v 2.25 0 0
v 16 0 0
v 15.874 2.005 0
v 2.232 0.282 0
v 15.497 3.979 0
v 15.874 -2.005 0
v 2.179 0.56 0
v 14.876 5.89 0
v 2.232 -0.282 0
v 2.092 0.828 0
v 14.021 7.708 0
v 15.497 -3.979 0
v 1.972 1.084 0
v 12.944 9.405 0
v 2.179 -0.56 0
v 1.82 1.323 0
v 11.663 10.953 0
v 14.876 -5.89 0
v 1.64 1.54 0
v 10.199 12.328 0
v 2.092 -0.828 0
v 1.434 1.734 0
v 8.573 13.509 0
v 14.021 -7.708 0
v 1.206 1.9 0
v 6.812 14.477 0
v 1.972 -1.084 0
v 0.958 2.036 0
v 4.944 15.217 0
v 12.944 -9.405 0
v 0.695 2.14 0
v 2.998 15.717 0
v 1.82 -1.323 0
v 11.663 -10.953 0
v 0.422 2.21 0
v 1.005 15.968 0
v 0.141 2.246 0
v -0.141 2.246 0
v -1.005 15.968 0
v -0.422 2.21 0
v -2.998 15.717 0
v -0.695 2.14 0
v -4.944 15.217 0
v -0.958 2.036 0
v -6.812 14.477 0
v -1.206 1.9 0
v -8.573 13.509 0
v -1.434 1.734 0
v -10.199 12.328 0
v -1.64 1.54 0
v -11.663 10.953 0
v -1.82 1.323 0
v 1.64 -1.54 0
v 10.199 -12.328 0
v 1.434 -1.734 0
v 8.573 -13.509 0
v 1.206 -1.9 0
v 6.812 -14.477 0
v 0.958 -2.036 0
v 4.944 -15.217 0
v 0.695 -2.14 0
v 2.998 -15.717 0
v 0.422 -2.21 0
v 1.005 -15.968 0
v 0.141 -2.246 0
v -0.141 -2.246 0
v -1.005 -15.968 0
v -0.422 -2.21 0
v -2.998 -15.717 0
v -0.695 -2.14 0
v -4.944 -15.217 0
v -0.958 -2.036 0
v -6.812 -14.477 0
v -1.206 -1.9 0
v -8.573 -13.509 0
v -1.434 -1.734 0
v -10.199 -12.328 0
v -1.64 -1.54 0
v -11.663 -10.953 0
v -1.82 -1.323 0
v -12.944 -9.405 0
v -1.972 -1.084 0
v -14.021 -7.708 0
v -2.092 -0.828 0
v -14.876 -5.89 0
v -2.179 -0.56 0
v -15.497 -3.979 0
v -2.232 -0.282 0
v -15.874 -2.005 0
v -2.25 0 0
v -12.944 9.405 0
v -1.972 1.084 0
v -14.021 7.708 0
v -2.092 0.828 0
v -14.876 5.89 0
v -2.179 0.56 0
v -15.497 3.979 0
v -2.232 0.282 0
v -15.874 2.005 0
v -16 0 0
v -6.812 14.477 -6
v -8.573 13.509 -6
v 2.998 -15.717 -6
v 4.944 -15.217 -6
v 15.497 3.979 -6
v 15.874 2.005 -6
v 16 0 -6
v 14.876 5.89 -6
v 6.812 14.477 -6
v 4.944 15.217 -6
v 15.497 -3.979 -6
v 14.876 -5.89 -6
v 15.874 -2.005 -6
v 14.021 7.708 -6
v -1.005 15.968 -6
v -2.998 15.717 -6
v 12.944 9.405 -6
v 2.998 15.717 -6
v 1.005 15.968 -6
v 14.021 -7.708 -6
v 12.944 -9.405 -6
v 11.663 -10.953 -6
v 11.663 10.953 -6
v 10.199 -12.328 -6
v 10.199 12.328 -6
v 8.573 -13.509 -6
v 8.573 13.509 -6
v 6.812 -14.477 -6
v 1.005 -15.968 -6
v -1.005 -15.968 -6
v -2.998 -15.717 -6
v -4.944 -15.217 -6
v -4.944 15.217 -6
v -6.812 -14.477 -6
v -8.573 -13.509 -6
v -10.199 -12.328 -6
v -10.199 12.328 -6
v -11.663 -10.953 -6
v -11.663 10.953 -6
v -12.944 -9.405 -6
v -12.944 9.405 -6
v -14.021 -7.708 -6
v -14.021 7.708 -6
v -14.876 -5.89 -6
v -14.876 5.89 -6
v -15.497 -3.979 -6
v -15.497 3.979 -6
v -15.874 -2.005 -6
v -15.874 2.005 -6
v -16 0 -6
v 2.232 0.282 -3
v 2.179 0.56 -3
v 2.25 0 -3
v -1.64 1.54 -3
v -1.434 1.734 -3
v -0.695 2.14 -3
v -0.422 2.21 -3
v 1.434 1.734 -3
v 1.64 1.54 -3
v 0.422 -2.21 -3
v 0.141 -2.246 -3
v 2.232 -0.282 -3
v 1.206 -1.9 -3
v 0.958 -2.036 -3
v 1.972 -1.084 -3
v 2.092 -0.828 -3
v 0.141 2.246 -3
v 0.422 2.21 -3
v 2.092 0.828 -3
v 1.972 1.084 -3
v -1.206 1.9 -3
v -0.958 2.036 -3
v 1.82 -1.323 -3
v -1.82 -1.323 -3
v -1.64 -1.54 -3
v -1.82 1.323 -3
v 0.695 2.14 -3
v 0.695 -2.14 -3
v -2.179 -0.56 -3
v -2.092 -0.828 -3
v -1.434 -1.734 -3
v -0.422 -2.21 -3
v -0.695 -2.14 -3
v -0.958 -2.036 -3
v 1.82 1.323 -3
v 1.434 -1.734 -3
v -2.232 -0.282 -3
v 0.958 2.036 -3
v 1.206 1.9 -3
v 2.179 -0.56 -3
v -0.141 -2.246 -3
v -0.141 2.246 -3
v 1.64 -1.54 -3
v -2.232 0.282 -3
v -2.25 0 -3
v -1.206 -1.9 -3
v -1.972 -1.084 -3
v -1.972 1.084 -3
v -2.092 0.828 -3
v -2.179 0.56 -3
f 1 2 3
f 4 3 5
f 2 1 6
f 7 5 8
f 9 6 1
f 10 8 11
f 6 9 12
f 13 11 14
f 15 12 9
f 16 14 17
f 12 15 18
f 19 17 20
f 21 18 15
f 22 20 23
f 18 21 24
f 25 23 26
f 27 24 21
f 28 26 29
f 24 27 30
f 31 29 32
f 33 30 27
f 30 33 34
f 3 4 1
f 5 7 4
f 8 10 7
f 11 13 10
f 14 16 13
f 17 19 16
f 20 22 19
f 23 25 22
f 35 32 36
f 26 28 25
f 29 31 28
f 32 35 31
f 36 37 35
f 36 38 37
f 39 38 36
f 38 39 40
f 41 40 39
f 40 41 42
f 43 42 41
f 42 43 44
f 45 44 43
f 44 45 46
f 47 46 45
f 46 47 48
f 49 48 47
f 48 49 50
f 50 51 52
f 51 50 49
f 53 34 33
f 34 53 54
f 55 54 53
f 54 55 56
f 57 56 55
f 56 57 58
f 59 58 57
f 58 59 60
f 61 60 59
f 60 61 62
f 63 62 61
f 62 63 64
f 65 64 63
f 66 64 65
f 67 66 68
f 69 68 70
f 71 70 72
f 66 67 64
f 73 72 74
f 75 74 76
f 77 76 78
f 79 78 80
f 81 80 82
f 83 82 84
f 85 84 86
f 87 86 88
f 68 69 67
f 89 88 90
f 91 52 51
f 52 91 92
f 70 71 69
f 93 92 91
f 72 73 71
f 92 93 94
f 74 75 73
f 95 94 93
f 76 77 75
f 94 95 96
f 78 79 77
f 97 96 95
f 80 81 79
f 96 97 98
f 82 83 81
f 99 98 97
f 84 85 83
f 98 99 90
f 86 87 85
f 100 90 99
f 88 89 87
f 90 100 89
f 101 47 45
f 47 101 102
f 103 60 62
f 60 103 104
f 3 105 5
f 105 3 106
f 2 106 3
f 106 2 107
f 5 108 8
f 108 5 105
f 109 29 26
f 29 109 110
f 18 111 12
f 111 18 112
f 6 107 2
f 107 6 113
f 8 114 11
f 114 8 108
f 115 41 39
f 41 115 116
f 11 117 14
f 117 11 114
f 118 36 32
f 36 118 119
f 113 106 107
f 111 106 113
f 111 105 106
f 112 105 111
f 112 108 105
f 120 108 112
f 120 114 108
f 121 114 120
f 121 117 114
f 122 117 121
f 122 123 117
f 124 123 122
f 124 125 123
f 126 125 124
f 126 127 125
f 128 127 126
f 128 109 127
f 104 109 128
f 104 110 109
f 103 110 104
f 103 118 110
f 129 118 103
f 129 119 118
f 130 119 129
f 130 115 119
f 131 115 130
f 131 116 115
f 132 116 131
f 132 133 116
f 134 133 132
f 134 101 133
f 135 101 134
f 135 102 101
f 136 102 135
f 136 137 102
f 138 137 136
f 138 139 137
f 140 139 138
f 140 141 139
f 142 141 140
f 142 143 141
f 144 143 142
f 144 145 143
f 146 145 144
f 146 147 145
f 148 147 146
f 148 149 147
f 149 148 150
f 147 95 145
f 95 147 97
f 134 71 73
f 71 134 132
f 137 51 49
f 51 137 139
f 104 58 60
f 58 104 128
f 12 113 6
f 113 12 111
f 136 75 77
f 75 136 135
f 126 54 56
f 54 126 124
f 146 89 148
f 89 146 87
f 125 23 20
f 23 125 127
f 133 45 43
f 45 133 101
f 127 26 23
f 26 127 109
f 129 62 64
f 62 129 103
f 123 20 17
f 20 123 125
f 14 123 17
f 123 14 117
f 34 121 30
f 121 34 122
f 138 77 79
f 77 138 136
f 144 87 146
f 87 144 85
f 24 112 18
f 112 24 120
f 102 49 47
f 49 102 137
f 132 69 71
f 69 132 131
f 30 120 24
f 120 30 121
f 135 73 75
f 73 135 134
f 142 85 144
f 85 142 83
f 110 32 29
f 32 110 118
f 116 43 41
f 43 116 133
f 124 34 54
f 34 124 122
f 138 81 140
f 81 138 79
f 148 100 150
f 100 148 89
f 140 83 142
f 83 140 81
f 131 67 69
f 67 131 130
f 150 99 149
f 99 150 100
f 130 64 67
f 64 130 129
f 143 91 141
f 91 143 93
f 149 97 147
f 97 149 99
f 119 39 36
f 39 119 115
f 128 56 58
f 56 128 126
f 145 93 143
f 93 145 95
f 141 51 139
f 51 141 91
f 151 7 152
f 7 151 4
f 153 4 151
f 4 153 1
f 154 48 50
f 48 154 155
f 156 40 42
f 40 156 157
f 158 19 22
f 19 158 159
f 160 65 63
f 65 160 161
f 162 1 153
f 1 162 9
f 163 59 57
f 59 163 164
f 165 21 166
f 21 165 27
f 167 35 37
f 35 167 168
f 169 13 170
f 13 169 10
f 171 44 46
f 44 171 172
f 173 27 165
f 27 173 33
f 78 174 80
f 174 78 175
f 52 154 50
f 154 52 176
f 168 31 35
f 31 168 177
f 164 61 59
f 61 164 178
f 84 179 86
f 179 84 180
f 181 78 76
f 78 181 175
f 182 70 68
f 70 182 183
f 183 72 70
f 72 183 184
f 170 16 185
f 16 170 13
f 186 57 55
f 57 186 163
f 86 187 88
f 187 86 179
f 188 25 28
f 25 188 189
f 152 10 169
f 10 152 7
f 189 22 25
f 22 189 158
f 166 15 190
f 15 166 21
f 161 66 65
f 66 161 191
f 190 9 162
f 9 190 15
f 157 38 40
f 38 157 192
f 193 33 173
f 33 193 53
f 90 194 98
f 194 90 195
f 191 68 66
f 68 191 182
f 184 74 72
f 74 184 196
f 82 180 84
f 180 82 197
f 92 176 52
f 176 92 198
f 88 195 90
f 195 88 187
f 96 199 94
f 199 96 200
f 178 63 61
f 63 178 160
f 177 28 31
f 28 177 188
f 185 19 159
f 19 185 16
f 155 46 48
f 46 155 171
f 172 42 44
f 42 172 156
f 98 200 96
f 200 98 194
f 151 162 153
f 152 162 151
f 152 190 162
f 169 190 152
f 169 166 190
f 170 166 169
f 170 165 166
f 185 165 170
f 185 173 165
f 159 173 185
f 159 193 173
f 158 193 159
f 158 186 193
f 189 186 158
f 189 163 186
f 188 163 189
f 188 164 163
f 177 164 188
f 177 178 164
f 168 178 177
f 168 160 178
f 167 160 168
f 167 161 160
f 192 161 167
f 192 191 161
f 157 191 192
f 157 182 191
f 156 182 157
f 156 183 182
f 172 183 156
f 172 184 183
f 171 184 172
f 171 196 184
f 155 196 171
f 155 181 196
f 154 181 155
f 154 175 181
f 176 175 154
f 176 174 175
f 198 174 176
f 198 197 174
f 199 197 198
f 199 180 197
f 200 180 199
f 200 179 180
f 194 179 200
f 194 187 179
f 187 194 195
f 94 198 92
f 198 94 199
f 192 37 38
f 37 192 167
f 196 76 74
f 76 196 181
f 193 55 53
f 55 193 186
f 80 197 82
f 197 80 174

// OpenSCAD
$fn = 50;


difference() {
	union() {
		translate(v = [0, 0, -3.0000000000]) {
			cylinder(h = 3, r = 10.0000000000);
		}
		translate(v = [0, 0, -6.0000000000]) {
			cylinder(h = 6, r = 16.0000000000);
		}
	}
	union() {
		#translate(v = [0, 0, -3]) {
			cylinder(h = 3, r = 2.2500000000);
		}
	}
}
